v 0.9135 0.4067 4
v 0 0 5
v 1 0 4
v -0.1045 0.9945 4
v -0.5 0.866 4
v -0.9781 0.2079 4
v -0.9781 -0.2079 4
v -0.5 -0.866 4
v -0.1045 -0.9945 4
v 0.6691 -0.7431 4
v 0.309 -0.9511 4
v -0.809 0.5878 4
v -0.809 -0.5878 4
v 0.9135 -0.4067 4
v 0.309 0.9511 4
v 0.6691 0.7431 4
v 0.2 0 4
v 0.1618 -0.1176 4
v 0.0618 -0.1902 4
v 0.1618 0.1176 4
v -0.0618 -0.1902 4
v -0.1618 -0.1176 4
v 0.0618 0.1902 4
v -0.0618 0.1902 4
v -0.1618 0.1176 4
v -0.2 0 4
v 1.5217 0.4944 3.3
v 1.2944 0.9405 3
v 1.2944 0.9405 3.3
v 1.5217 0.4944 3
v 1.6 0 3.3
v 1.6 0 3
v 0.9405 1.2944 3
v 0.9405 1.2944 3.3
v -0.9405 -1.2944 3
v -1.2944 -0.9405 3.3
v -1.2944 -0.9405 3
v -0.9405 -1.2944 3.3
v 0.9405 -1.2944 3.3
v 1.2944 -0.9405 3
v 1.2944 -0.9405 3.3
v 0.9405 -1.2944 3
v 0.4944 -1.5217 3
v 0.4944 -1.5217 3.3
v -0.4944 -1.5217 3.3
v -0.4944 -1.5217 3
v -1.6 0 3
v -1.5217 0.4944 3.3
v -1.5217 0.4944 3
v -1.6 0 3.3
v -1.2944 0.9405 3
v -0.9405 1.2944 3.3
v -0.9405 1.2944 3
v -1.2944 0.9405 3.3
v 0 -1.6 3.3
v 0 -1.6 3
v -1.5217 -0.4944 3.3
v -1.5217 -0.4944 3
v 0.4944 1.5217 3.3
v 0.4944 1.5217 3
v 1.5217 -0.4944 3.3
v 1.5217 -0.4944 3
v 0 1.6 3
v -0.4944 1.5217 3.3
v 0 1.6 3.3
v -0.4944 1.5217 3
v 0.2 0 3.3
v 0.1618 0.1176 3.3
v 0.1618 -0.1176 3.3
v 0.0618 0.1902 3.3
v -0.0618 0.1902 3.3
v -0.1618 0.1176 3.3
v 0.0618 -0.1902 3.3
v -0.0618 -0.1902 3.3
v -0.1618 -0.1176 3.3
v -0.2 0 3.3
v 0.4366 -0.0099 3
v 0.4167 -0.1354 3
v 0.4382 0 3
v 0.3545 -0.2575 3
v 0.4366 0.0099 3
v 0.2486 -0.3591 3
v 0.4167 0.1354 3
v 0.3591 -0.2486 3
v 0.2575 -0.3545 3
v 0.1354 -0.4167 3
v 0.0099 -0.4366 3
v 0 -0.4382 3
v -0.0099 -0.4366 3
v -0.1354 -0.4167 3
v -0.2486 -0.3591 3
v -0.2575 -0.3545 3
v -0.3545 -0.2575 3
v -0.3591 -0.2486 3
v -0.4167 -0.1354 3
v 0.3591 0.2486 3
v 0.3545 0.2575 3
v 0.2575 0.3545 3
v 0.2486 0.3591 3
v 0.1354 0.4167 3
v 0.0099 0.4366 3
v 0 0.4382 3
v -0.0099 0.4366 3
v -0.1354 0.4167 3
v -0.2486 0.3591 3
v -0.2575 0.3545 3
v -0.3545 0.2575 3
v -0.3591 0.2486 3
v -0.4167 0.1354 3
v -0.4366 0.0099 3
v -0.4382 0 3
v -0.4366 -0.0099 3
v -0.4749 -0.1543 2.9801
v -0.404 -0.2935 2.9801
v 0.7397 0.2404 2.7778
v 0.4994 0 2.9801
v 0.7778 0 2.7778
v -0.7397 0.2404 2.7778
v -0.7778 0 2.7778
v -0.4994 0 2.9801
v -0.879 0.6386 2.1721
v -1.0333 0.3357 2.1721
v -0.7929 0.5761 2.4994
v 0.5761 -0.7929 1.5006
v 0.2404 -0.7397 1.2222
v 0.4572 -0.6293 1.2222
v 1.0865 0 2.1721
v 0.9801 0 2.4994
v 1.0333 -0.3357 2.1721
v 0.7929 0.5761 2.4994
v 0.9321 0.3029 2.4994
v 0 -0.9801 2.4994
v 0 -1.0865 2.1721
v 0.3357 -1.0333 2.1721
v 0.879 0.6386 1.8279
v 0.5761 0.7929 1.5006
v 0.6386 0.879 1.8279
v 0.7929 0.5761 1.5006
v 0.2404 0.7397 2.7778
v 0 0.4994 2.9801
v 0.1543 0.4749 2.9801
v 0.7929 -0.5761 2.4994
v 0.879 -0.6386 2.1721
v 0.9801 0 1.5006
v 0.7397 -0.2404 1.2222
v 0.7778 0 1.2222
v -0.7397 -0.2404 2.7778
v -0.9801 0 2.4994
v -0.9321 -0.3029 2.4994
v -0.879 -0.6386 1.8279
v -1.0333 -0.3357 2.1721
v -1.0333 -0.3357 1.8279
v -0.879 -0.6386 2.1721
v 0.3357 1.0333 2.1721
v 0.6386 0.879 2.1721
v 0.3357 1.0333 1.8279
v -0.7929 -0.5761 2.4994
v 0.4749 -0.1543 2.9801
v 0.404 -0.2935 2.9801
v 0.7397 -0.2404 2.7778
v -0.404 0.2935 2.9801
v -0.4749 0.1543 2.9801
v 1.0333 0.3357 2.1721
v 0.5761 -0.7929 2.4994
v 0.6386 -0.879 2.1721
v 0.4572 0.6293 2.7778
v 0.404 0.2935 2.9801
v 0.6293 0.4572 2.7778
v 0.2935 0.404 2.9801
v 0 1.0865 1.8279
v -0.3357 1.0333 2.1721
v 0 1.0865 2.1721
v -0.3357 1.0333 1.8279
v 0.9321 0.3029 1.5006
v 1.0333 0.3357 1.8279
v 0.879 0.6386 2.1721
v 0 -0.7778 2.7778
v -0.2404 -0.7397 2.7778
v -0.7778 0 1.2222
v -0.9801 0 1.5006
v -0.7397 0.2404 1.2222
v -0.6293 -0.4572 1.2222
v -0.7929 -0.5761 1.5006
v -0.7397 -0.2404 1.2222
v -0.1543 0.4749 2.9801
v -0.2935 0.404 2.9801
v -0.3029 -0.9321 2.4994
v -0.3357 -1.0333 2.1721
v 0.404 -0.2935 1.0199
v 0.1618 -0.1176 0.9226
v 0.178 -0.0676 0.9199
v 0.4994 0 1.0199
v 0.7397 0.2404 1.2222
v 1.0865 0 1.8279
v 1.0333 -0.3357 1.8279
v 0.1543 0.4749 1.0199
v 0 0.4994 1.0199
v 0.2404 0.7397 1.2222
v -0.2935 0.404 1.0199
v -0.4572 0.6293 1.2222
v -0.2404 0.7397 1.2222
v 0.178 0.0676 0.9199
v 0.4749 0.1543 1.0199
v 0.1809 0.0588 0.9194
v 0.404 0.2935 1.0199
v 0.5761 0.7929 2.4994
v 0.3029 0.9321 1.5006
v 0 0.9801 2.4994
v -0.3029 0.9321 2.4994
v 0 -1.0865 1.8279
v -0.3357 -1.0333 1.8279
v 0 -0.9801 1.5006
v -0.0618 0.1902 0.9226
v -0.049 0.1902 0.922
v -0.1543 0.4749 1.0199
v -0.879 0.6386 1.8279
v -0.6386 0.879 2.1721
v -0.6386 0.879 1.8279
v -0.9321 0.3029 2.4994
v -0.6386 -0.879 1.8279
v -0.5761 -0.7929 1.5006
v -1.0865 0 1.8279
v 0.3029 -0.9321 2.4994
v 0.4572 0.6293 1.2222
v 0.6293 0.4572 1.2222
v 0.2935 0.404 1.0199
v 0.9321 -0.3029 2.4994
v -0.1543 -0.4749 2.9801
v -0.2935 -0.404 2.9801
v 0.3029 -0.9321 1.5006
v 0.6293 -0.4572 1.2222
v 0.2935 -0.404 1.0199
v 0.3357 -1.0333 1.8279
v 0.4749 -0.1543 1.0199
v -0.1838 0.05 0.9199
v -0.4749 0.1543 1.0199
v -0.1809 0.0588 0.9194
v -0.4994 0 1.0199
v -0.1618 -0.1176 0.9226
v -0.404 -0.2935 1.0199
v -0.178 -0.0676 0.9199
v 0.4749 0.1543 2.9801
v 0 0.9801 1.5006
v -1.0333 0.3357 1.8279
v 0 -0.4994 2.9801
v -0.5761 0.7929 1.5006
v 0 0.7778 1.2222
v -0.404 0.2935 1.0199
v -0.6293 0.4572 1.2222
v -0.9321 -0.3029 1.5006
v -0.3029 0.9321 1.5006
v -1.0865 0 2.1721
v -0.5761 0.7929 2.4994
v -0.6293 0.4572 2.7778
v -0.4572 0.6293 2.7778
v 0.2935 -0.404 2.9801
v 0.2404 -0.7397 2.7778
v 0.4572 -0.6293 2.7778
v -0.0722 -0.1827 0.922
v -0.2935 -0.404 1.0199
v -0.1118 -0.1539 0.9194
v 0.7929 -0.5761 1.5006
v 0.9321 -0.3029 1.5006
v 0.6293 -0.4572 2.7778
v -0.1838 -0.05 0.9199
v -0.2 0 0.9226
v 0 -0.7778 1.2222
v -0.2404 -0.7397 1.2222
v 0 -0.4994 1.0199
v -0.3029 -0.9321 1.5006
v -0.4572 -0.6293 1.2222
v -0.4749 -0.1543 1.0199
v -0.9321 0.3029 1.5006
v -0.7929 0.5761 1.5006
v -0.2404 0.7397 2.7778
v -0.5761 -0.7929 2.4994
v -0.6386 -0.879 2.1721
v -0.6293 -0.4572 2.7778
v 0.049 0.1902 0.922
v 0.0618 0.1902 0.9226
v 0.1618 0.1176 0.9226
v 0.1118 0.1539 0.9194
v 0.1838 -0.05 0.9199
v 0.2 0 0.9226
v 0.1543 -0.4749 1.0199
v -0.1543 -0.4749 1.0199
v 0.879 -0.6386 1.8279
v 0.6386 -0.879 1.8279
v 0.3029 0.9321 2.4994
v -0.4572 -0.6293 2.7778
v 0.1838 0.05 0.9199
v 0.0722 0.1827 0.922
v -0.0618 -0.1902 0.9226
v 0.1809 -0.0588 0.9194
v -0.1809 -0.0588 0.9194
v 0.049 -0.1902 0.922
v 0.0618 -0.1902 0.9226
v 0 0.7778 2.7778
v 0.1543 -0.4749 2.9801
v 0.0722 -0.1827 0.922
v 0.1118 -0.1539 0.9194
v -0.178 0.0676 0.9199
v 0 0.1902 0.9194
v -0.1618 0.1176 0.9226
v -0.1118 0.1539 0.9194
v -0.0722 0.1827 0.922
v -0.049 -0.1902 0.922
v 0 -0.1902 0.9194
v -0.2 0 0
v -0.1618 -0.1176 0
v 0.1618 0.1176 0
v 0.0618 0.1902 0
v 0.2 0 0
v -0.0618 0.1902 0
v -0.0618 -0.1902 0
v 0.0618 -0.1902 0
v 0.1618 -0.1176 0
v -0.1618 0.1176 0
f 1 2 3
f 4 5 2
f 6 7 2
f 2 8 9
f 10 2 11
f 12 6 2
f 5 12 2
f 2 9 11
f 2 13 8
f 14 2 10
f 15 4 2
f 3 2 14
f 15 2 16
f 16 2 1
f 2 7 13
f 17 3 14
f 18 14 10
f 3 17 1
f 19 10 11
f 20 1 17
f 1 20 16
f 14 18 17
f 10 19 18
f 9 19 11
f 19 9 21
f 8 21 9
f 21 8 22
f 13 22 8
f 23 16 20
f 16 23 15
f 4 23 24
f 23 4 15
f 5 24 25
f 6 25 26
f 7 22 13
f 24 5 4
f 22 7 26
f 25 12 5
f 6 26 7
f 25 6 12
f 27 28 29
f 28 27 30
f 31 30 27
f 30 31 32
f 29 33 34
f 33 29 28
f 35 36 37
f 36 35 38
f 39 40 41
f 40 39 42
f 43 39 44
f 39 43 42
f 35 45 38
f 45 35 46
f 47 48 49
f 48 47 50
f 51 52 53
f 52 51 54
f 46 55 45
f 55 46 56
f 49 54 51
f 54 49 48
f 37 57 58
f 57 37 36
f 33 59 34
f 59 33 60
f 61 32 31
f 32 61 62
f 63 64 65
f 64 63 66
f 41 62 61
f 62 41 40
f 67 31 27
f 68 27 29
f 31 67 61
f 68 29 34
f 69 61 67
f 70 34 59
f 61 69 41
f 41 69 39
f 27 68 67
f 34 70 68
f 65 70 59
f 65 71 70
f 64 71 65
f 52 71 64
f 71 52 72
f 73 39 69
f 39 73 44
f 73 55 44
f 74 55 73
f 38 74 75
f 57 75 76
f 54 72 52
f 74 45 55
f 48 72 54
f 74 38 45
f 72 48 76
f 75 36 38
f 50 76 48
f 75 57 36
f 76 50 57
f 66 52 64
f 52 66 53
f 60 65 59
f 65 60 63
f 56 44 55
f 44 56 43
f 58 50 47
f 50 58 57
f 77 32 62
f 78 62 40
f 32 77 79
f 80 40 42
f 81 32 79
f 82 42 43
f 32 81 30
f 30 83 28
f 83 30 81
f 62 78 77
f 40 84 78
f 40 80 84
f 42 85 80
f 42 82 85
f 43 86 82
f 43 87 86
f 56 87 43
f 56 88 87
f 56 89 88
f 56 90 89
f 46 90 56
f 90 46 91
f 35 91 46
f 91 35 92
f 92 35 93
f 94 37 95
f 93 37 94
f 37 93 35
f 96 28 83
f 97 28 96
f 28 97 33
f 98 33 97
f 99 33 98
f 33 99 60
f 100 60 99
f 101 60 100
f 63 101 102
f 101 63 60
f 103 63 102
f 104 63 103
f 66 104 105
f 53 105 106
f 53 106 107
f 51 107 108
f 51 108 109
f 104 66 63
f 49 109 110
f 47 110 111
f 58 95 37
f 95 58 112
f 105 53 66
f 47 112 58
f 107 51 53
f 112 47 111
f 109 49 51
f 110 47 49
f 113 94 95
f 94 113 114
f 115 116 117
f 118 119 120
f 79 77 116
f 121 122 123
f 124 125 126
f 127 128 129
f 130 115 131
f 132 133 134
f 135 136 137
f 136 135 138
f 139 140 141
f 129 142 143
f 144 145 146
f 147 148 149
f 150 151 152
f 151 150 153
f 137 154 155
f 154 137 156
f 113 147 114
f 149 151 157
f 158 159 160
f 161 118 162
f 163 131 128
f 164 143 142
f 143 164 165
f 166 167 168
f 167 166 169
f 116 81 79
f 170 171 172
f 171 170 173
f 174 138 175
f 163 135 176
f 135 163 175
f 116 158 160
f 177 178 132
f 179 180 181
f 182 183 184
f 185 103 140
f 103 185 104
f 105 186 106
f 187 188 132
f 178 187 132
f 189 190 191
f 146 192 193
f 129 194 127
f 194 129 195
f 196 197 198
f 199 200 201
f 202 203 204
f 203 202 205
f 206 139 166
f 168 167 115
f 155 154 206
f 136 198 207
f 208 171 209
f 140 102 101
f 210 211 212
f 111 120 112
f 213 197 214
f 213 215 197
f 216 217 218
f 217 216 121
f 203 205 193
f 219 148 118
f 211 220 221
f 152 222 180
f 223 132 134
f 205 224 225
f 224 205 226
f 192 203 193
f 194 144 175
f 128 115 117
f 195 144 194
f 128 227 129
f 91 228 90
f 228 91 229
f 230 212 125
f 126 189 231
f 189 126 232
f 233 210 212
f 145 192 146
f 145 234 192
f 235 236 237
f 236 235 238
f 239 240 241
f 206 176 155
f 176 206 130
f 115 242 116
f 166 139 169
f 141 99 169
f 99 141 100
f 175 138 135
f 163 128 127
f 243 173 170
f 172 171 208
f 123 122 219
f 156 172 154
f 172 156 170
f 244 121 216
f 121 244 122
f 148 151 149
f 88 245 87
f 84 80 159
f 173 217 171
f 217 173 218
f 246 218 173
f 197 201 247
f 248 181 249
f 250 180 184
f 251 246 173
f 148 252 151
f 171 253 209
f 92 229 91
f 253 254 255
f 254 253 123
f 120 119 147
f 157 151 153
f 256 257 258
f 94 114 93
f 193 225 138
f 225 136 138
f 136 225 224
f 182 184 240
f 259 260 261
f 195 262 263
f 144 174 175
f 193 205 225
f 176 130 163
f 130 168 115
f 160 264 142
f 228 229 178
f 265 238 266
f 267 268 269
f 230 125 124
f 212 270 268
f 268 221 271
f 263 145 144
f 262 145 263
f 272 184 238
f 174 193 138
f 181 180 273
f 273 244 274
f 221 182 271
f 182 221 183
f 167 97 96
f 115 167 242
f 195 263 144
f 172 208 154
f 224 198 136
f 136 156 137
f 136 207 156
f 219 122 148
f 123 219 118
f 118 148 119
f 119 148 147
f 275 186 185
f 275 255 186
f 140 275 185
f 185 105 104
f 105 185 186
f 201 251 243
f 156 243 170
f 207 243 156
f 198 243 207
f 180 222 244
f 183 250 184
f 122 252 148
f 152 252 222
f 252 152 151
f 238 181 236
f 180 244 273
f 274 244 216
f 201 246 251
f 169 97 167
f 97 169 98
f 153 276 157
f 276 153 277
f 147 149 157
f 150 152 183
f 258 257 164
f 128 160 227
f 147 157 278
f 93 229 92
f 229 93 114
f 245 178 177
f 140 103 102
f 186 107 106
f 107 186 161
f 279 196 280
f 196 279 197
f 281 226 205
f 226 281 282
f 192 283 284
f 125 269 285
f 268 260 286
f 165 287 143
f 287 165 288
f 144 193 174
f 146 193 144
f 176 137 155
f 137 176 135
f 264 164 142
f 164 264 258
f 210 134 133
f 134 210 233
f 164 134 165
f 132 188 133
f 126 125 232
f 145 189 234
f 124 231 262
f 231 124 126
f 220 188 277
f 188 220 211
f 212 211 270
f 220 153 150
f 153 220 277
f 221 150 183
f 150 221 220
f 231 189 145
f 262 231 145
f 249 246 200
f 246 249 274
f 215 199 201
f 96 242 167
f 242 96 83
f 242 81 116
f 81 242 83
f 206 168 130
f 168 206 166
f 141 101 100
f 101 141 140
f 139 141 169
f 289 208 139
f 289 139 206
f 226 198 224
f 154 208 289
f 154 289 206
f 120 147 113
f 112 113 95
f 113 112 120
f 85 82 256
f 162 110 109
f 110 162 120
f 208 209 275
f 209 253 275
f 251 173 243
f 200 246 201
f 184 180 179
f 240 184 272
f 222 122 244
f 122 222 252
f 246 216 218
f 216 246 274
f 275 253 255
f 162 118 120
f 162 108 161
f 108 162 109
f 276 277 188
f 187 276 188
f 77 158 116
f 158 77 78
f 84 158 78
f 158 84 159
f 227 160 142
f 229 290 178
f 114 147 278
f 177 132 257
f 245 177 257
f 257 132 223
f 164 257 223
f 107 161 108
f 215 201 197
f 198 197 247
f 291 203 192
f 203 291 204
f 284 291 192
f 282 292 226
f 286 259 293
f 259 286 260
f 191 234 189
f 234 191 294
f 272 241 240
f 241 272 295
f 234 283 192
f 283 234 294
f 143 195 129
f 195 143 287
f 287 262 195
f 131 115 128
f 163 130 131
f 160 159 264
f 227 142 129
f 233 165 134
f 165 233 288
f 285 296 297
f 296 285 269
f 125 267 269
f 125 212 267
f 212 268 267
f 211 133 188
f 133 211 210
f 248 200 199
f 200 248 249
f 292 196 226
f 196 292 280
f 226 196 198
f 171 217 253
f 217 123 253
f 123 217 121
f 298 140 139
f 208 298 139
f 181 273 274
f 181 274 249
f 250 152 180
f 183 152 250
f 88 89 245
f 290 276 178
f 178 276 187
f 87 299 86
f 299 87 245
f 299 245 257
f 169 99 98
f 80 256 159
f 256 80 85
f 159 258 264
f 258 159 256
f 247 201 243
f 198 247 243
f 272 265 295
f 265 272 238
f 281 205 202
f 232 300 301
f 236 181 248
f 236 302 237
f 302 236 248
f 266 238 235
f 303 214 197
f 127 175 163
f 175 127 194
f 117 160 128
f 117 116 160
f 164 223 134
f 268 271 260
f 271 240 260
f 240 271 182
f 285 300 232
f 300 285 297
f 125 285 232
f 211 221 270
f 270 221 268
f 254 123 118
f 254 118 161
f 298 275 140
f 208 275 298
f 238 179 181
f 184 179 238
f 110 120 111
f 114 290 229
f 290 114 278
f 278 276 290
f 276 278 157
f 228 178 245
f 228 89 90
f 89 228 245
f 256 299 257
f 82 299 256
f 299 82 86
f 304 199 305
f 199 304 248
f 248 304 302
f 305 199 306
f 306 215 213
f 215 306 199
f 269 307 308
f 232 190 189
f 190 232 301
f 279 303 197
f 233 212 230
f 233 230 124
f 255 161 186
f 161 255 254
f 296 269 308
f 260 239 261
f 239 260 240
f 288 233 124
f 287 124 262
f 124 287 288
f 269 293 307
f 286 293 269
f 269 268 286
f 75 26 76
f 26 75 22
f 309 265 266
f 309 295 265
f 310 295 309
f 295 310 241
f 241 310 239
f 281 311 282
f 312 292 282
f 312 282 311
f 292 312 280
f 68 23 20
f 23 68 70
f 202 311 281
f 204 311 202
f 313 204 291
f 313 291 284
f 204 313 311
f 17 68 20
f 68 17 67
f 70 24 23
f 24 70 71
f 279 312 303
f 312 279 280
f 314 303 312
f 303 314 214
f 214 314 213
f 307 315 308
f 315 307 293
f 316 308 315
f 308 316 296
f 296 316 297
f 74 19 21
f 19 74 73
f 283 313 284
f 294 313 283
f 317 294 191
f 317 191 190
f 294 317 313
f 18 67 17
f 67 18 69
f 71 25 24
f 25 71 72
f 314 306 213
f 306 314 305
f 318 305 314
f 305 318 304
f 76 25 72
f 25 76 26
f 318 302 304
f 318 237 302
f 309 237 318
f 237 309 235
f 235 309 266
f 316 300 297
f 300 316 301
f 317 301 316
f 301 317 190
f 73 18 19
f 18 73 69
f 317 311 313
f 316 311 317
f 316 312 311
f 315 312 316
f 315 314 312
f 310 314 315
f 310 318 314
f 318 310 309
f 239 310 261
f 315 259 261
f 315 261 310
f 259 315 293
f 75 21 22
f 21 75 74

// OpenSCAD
color("Yellow")
translate([0,0,4])
cylinder(1, 1, 0, $fn=15);
color("SteelBlue")
translate([0,0,3])
cylinder(0.3, 1.6, 1.6, $fn=20);
color("SteelBlue")
translate([0, 0, 2])
sphere(1.1,$fn=20);
color("Yellow")
cylinder(4, 0.2, 0.2, $fn=10);
